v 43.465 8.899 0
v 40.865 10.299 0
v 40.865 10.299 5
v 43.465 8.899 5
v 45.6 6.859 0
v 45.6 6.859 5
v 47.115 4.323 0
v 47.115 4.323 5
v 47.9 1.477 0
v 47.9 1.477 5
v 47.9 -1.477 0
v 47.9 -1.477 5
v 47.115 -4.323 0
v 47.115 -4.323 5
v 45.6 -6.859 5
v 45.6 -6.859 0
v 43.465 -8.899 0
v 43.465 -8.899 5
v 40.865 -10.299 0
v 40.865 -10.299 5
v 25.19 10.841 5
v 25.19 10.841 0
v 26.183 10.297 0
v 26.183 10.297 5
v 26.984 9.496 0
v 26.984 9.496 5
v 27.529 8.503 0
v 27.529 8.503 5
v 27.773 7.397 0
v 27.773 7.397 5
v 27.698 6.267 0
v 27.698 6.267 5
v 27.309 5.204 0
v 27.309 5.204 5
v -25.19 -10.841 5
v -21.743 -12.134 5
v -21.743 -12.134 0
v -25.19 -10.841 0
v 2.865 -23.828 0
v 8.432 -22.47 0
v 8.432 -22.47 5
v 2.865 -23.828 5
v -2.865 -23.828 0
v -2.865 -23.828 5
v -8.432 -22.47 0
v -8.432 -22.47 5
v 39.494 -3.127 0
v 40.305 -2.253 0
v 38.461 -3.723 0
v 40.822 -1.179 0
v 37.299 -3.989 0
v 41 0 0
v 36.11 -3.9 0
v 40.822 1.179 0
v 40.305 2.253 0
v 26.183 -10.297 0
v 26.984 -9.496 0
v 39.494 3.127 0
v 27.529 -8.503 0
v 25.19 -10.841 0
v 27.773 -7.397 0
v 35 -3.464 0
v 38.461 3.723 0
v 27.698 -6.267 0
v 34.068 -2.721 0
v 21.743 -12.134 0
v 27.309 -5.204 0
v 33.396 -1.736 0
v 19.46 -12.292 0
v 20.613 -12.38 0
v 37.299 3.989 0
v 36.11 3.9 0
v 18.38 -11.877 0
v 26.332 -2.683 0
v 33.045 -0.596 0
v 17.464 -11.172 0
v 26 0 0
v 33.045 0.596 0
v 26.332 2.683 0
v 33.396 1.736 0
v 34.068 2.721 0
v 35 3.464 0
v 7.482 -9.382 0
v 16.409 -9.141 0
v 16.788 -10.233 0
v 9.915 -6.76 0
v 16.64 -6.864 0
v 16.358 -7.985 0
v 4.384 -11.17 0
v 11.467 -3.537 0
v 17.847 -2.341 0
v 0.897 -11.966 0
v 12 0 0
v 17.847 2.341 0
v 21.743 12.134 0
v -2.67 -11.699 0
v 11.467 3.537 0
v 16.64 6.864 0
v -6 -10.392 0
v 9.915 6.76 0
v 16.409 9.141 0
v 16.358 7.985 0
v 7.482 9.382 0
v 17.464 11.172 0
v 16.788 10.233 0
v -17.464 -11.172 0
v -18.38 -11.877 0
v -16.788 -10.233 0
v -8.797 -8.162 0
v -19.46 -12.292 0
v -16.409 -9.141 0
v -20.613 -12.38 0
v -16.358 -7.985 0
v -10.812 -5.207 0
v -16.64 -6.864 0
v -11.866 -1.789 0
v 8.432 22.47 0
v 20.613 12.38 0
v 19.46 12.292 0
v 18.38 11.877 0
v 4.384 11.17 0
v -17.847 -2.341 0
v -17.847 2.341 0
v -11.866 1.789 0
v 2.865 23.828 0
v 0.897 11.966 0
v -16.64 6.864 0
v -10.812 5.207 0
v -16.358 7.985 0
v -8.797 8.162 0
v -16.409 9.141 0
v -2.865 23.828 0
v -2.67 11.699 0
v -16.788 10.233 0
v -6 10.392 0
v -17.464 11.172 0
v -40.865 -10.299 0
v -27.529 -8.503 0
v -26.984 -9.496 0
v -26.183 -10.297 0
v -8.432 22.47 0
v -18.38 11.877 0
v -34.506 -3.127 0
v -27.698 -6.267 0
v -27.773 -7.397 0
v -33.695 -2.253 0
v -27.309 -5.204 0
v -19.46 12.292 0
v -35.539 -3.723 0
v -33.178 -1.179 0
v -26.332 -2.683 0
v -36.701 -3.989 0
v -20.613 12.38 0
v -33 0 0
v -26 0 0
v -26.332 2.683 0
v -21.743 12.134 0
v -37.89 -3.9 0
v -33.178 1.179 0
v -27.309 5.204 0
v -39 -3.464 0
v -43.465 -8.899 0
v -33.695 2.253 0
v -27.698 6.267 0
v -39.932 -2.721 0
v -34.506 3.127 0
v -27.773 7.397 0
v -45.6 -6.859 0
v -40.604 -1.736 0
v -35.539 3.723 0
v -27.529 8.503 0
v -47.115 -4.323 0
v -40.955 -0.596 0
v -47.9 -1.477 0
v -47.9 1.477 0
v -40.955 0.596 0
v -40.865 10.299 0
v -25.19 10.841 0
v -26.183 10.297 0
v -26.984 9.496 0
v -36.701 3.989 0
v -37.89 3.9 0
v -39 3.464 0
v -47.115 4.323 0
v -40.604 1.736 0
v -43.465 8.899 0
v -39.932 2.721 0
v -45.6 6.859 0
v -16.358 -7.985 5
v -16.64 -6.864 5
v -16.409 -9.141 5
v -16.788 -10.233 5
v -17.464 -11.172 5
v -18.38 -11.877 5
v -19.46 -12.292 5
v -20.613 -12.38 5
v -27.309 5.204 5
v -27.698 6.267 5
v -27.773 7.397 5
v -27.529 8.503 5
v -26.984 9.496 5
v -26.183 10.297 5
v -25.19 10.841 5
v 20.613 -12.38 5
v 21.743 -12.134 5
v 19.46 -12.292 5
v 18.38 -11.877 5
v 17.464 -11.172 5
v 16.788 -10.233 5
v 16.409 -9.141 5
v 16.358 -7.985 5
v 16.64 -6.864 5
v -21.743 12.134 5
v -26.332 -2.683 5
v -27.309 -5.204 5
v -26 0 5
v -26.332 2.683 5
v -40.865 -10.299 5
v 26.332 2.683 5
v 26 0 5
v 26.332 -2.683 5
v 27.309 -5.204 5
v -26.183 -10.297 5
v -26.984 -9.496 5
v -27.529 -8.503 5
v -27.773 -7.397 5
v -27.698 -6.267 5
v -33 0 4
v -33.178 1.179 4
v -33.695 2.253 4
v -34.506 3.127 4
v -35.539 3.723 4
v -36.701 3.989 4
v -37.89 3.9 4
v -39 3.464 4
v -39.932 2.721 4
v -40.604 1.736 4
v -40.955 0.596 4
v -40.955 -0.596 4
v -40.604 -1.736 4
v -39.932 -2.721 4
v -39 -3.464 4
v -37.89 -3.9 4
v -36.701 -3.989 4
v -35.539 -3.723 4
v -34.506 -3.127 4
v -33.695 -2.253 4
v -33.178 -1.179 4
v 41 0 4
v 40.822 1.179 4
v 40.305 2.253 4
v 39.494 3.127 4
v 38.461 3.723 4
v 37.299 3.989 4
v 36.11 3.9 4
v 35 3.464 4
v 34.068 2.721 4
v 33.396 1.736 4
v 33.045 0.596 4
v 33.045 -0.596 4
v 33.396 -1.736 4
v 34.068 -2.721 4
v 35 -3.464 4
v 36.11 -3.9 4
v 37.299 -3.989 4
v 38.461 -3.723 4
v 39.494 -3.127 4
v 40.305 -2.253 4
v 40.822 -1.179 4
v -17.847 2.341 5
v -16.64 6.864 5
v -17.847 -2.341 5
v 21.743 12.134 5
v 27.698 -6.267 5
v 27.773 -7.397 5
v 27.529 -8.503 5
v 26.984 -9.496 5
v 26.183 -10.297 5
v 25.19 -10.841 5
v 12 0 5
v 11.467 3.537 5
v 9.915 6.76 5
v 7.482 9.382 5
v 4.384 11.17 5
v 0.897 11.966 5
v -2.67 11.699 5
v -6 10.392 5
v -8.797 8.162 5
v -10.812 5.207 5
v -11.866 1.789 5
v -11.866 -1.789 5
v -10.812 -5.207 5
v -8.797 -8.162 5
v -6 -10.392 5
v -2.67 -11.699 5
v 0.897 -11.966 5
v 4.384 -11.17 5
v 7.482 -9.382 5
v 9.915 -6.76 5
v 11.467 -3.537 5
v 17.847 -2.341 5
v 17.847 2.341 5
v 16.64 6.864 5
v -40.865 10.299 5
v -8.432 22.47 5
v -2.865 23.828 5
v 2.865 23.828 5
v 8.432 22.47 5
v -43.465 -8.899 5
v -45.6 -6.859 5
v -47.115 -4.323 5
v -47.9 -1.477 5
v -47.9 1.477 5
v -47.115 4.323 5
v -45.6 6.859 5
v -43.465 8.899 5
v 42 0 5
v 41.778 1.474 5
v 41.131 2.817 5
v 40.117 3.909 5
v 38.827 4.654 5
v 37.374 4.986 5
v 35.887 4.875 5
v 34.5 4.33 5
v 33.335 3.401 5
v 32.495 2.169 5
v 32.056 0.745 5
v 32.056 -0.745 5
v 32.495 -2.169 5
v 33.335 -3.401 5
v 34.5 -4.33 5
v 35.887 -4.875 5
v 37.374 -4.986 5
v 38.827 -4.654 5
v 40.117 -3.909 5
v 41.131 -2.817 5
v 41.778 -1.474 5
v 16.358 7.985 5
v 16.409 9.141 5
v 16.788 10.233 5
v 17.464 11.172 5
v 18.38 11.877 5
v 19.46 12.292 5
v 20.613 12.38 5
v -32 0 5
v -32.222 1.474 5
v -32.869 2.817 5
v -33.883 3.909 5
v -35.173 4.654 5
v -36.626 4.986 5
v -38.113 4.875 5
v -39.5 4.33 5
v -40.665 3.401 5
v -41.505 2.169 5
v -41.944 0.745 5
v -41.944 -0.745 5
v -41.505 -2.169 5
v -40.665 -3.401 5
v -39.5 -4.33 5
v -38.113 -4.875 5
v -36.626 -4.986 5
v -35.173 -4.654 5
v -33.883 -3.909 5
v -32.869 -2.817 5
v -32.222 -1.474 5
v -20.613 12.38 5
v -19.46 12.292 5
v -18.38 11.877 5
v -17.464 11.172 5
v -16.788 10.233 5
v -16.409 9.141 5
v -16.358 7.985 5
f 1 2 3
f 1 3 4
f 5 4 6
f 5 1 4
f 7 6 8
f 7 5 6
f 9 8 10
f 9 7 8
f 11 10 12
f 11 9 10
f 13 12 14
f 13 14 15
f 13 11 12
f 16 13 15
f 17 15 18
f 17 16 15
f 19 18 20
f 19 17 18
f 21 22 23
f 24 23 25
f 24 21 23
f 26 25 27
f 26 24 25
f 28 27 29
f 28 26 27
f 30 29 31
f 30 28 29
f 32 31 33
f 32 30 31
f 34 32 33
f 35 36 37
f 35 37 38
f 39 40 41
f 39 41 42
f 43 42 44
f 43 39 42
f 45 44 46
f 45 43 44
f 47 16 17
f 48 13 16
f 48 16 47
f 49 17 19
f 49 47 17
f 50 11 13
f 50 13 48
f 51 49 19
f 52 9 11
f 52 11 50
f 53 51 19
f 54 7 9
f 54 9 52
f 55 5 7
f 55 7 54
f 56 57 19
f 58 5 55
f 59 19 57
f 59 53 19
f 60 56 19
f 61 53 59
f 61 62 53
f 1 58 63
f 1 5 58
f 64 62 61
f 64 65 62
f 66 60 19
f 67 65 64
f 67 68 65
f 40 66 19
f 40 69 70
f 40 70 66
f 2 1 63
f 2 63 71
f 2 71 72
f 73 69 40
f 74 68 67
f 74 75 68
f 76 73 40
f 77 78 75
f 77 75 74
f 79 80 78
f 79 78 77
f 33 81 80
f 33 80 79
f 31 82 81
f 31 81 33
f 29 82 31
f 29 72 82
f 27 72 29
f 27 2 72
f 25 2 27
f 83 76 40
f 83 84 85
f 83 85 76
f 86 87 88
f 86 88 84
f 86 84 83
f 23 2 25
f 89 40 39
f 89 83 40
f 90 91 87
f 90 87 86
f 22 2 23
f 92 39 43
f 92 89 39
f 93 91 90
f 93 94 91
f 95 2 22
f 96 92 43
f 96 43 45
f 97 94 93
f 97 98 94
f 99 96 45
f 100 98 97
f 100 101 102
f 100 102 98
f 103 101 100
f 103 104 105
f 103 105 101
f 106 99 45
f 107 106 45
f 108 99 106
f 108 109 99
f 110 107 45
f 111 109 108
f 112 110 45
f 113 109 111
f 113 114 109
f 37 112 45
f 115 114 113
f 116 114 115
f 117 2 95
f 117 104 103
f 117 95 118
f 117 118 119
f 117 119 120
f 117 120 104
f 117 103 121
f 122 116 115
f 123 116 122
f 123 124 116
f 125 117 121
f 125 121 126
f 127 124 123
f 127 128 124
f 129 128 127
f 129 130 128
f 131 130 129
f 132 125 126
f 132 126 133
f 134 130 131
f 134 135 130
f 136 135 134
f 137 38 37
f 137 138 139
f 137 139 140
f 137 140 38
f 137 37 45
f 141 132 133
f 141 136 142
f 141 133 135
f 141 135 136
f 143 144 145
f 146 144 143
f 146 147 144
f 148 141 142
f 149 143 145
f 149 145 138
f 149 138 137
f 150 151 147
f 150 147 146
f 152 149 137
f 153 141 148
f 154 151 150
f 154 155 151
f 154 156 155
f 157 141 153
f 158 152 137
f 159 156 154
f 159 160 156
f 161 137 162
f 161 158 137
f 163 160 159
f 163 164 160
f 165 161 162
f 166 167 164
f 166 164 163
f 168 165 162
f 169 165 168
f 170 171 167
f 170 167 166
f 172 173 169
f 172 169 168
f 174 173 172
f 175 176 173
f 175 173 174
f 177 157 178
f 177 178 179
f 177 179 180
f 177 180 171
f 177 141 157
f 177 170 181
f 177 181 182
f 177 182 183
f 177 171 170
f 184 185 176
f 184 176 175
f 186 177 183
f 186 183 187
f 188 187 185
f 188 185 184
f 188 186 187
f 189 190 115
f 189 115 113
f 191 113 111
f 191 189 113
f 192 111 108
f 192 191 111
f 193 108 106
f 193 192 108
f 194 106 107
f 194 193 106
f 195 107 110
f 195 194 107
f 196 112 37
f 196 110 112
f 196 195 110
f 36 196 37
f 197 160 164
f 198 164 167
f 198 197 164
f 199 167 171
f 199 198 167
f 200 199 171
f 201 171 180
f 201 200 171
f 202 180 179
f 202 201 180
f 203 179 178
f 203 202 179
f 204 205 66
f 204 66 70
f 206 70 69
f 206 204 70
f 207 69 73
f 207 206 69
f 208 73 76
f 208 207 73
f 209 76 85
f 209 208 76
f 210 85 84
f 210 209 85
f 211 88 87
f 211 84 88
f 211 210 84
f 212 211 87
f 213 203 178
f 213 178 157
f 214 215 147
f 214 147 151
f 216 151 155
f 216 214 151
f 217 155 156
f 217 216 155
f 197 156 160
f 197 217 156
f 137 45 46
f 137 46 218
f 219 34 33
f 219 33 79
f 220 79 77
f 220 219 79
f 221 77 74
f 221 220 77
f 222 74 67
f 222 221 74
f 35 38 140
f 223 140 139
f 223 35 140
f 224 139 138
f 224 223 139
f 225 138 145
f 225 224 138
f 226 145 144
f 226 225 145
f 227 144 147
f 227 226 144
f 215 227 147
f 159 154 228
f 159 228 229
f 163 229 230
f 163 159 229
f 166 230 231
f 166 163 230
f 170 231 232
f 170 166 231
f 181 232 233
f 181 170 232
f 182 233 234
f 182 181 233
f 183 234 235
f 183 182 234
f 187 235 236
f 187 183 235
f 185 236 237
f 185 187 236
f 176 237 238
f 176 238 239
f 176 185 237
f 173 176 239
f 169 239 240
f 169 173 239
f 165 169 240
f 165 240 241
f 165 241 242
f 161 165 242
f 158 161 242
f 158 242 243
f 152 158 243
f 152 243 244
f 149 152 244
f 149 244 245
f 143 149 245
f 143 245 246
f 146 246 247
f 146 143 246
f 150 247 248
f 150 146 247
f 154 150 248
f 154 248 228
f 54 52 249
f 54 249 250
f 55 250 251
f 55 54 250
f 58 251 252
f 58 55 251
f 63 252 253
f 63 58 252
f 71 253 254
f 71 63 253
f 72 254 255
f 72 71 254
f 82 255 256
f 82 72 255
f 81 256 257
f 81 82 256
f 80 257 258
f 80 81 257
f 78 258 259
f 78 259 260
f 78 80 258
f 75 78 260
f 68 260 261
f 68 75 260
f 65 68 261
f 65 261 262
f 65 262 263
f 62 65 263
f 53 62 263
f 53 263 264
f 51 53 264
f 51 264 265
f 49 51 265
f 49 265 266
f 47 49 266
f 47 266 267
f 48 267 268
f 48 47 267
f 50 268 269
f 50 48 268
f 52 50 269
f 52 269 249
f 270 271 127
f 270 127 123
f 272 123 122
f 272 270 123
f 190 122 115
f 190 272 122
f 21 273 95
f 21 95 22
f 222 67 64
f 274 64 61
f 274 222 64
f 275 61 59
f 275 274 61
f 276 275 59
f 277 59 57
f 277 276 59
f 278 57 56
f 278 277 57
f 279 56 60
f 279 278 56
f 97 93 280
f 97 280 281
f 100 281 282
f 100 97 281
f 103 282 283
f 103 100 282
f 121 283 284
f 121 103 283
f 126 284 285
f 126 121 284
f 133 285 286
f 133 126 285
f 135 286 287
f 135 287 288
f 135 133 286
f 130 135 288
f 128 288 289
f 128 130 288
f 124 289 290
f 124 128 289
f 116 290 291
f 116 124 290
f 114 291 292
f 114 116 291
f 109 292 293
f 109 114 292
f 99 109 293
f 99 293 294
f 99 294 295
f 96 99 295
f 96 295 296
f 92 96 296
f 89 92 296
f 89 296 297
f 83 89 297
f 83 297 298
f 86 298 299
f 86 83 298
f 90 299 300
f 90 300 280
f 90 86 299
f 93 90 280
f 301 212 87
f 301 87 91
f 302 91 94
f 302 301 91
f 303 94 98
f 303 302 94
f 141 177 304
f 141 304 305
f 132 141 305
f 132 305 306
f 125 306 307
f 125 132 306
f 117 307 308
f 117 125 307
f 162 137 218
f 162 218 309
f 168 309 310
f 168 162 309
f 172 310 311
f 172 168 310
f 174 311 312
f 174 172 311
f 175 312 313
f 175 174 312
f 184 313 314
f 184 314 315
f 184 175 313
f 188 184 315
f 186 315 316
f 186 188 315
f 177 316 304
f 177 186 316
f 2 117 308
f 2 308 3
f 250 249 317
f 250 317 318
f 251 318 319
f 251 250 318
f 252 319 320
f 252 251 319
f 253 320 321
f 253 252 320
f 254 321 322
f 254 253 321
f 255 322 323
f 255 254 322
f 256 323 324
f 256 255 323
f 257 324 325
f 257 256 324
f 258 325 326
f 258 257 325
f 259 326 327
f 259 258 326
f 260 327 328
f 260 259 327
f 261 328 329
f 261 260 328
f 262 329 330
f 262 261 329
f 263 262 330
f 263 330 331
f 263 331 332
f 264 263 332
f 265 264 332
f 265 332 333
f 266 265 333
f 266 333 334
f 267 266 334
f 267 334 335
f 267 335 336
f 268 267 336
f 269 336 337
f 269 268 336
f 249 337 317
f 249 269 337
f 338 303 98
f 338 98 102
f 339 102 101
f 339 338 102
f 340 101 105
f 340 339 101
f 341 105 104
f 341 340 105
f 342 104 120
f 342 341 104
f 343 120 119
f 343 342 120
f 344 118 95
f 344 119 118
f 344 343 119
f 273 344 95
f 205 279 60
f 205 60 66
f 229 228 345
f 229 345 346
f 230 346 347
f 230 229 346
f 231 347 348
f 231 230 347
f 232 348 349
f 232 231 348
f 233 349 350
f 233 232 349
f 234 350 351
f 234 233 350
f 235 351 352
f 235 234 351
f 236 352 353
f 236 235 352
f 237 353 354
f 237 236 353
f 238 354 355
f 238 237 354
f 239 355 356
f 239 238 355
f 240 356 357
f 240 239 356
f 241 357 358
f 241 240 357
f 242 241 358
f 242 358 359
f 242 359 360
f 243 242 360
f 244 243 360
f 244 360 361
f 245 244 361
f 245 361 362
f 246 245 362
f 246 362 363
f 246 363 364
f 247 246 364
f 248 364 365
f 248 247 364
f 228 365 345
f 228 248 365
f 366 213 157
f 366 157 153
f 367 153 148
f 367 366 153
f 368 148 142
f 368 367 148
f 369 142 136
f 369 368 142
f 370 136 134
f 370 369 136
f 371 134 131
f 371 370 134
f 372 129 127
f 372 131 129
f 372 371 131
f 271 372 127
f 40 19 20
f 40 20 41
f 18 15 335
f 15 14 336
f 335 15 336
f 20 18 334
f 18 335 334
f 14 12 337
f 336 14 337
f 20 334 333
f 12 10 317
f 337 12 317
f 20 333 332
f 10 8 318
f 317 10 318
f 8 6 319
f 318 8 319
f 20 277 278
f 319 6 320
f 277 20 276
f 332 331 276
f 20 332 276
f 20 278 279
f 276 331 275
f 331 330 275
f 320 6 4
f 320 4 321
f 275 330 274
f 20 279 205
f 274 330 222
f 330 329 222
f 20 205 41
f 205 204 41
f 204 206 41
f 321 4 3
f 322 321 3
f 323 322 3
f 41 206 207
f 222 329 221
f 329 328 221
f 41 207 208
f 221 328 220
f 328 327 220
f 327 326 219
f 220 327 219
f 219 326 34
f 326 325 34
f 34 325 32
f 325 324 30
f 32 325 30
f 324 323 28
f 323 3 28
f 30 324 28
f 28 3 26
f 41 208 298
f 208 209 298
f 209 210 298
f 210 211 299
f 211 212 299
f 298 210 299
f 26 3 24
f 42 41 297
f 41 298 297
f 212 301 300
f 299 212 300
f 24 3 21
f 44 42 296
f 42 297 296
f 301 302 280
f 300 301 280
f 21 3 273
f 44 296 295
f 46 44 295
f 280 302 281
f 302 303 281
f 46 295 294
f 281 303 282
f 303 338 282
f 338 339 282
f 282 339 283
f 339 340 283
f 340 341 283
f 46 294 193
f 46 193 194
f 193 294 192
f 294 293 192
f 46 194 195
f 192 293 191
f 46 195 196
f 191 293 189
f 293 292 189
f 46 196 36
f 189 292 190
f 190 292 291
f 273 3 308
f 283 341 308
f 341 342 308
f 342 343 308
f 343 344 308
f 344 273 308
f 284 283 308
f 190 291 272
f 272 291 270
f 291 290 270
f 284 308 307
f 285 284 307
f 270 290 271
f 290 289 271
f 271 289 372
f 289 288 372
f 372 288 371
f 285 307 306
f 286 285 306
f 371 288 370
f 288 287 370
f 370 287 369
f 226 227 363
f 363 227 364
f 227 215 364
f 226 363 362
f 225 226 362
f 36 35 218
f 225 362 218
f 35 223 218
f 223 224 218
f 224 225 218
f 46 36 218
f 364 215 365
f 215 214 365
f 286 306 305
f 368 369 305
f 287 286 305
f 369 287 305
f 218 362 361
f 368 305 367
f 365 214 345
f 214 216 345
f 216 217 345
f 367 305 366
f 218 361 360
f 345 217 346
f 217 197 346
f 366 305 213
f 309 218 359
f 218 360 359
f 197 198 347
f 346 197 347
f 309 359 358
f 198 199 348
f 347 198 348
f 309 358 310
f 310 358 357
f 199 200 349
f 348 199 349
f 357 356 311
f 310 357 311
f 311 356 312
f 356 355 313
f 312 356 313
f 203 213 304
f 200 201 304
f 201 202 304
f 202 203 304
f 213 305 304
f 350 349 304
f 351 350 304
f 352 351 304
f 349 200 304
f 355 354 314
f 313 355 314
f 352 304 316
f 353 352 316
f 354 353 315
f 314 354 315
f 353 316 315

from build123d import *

# Parameters (mm, degrees)
SKETCH1_R           = 4
SKETCH1_R_2         = 12
BOSS_EXTRUDE1_DEPTH = 5
CUT_EXTRUDE1_REACH  = 55.898
CHAMFER1_SIZE       = 1


with BuildPart() as part:
    # Sketch1 → Boss-Extrude1 (new body)
    with BuildSketch(Plane.XY):
        with BuildLine():
            Line((-40.864864865, 10.298680477), (-8.432432432, 22.469848314))
            ThreePointArc((-8.432432432, 22.469848314), (0, 24), (8.432432432, 22.469848314))
            Line((8.432432432, 22.469848314), (40.864864865, 10.298680477))
            ThreePointArc((40.864864865, 10.298680477), (48, 0), (40.864864865, -10.298680477))
            Line((40.864864865, -10.298680477), (8.432432432, -22.469848314))
            ThreePointArc((8.432432432, -22.469848314), (0, -24), (-8.432432432, -22.469848314))
            Line((-8.432432432, -22.469848314), (-40.864864865, -10.298680477))
            ThreePointArc((-40.864864865, -10.298680477), (-48, 0), (-40.864864865, 10.298680477))
        make_face()
        with Locations((-37, 0)):
            Circle(SKETCH1_R, mode=Mode.SUBTRACT)
        with Locations((37, 0)):
            Circle(SKETCH1_R, mode=Mode.SUBTRACT)
        Circle(SKETCH1_R_2, mode=Mode.SUBTRACT)
    extrude(amount=BOSS_EXTRUDE1_DEPTH)

    # Sketch2 → Cut-Extrude1 (cut, up to next)
    with BuildSketch(Plane.XY.offset(5), mode=Mode.PRIVATE) as cut_extrude1_sk1:
        with BuildLine():
            Line((21.743091746, 12.134165045), (25.1898452, 10.840675422))
            ThreePointArc((25.1898452, 10.840675422), (27.528705446, 8.50299411), (27.308589183, 5.203513849))
            ThreePointArc((27.308589183, 5.203513849), (26, 0), (27.308589183, -5.203513849))
            ThreePointArc((27.308589183, -5.203513849), (27.528705446, -8.50299411), (25.1898452, -10.840675422))
            Line((25.1898452, -10.840675422), (21.743091746, -12.134165045))
            ThreePointArc((21.743091746, -12.134165045), (17.464066334, -11.171690651), (16.639925188, -6.863882994))
            ThreePointArc((16.639925188, -6.863882994), (18, 0), (16.639925188, 6.863882994))
            ThreePointArc((16.639925188, 6.863882994), (17.464066334, 11.171690651), (21.743091746, 12.134165045))
        make_face()
    cut_extrude1_tool1 = extrude(cut_extrude1_sk1.sketch, amount=-CUT_EXTRUDE1_REACH, mode=Mode.PRIVATE) & part.part
    # Sketch2 → Cut-Extrude1 (cut, up to next)
    with BuildSketch(Plane.XY.offset(5), mode=Mode.PRIVATE) as cut_extrude1_sk2:
        with BuildLine():
            Line((-21.743091746, -12.134165045), (-25.1898452, -10.840675422))
            ThreePointArc((-25.1898452, -10.840675422), (-27.528705446, -8.50299411), (-27.308589183, -5.203513849))
            ThreePointArc((-27.308589183, -5.203513849), (-26, 0), (-27.308589183, 5.203513849))
            ThreePointArc((-27.308589183, 5.203513849), (-27.528705446, 8.50299411), (-25.1898452, 10.840675422))
            Line((-25.1898452, 10.840675422), (-21.743091746, 12.134165045))
            ThreePointArc((-21.743091746, 12.134165045), (-17.464066334, 11.171690651), (-16.639925188, 6.863882994))
            ThreePointArc((-16.639925188, 6.863882994), (-18, 0), (-16.639925188, -6.863882994))
            ThreePointArc((-16.639925188, -6.863882994), (-17.464066334, -11.171690651), (-21.743091746, -12.134165045))
        make_face()
    cut_extrude1_tool2 = extrude(cut_extrude1_sk2.sketch, amount=-CUT_EXTRUDE1_REACH, mode=Mode.PRIVATE) & part.part
    add(cut_extrude1_tool1.solids().sort_by_distance((21.936549, 0, 5))[0], mode=Mode.SUBTRACT)
    add(cut_extrude1_tool2.solids().sort_by_distance((-21.936549, 0, 5))[0], mode=Mode.SUBTRACT)

    # Chamfer1
    chamfer1_edges = [part.edges().sort_by_distance(p)[0] for p in [
        (33, 0, 5),
        (-41, 0, 5),
    ]]
    chamfer(chamfer1_edges, length=CHAMFER1_SIZE)


solid = part.part
